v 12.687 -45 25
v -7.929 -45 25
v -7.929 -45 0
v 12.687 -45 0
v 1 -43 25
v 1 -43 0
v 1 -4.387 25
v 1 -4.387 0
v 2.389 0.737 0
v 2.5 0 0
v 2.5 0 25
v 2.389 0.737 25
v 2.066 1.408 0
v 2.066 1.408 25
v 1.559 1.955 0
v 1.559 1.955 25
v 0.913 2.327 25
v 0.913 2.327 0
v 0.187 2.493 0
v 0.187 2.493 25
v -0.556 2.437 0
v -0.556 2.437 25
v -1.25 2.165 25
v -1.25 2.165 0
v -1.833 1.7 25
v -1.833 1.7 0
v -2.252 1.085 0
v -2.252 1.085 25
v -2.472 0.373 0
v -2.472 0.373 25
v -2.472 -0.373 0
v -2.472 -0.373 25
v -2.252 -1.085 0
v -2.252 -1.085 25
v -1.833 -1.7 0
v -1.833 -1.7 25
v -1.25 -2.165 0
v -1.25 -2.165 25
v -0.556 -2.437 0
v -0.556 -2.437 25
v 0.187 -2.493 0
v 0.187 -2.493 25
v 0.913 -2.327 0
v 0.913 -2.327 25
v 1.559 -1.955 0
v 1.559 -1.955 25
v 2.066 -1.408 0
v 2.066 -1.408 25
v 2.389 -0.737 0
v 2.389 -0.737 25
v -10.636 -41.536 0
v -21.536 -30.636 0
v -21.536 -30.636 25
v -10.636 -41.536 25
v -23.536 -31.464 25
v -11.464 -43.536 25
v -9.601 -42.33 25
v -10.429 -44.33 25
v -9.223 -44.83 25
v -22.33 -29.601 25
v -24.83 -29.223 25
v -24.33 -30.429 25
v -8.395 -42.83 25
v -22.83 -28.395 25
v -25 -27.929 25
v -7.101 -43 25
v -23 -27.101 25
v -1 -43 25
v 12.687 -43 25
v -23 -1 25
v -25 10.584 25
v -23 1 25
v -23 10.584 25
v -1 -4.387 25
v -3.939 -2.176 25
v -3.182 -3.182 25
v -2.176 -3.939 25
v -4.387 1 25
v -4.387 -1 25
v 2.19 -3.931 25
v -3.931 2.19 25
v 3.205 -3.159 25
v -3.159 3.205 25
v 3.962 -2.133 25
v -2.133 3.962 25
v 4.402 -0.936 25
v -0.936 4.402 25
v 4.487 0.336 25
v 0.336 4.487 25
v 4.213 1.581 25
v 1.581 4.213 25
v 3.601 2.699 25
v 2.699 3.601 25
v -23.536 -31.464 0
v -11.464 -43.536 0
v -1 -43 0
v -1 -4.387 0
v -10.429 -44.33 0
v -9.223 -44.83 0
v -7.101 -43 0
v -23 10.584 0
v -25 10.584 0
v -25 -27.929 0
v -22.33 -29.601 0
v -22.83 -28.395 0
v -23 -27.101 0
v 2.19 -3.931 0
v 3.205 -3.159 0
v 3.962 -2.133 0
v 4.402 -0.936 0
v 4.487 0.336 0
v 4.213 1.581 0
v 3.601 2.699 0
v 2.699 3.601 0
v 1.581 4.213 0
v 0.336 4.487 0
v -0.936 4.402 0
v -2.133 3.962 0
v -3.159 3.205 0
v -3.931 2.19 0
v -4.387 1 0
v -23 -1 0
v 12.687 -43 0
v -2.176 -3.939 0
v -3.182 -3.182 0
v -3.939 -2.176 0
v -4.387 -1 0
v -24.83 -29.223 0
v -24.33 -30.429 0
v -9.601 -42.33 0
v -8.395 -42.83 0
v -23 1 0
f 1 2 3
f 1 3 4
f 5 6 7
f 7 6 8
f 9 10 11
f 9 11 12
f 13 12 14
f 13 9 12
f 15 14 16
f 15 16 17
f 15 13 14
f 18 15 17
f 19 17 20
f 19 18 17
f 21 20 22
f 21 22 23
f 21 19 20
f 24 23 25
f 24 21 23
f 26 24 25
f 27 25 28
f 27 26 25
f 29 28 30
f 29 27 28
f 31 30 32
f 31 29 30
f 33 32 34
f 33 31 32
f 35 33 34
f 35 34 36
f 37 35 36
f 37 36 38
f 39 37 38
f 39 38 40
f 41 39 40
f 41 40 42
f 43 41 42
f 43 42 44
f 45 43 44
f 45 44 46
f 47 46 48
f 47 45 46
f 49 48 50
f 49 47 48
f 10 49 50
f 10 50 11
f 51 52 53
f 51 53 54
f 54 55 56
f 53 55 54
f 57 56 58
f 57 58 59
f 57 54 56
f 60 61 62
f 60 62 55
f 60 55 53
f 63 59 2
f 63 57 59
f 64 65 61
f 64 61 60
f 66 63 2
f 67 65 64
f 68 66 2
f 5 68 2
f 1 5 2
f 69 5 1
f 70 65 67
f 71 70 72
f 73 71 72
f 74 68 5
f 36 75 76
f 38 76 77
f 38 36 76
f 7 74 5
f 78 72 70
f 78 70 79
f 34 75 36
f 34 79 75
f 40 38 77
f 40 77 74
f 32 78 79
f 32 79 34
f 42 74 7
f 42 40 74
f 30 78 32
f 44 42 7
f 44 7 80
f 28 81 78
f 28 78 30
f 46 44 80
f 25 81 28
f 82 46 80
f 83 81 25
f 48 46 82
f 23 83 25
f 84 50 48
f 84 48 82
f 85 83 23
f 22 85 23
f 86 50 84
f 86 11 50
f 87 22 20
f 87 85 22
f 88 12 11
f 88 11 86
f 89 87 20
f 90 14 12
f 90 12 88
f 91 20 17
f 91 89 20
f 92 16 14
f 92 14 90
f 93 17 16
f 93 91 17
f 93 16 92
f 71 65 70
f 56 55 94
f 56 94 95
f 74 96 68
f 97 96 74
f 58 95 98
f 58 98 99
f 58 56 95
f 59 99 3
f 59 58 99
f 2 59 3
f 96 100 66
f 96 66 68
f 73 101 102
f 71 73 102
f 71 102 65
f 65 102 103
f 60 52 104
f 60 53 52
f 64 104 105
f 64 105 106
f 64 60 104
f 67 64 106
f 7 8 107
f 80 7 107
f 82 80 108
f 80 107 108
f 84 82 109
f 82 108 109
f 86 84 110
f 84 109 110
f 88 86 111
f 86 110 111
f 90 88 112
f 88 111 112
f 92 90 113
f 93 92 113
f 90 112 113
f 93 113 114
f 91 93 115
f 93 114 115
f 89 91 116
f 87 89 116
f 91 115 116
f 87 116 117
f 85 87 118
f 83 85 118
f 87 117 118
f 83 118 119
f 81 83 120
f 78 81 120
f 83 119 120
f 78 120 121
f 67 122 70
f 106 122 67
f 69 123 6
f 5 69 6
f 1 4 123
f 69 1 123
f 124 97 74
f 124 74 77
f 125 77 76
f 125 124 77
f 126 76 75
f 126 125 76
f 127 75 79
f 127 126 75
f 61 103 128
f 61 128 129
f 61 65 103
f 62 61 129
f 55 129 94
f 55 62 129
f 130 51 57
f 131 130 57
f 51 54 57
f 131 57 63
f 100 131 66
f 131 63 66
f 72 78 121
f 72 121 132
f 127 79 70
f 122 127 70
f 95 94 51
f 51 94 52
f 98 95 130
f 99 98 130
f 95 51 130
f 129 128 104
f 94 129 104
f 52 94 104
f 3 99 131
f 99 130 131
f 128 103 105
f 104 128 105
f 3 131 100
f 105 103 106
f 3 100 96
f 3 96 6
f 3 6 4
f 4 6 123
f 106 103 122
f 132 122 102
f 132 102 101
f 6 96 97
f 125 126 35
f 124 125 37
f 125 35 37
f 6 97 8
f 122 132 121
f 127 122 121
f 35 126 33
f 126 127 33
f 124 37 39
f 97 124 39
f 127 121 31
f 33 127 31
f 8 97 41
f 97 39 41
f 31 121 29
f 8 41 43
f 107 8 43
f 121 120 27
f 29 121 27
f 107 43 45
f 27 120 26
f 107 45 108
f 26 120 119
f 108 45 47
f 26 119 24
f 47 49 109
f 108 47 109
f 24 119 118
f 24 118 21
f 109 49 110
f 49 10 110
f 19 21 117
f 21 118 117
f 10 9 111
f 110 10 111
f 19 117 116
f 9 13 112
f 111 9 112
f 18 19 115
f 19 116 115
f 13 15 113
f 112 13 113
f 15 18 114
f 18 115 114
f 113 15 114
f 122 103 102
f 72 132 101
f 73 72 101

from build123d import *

# Parameters (mm, degrees)
SKETCH1_R           = 2.5
BOSS_EXTRUDE1_DEPTH = 25
FILLET1_R           = 5


with BuildPart() as part:
    # Sketch1 → Boss-Extrude1 (new body)
    with BuildSketch(Plane.XY):
        with BuildLine():
            Line((-25, 10.583953595), (-25, -30))
            Line((-25, -30), (-10, -45))
            Line((-10, -45), (12.687018602, -45))
            Line((12.687018602, -45), (12.687018602, -43))
            Line((12.687018602, -43), (1, -43))
            Line((1, -43), (1, -4.387482194))
            ThreePointArc((1, -4.387482194), (3.181980515, 3.181980515), (-4.387482194, 1))
            Line((-4.387482194, 1), (-23, 1))
            Line((-23, 1), (-23, 10.583953595))
            Line((-23, 10.583953595), (-25, 10.583953595))
        make_face()
        Circle(SKETCH1_R, mode=Mode.SUBTRACT)
        with BuildLine():
            Line((-23, -29.171572875), (-9.171572875, -43))
            Line((-9.171572875, -43), (-1, -43))
            Line((-1, -43), (-1, -4.387482194))
            ThreePointArc((-1, -4.387482194), (-3.181980515, -3.181980515), (-4.387482194, -1))
            Line((-4.387482194, -1), (-23, -1))
            Line((-23, -1), (-23, -29.171572875))
        make_face(mode=Mode.SUBTRACT)
    extrude(amount=BOSS_EXTRUDE1_DEPTH)

    # Fillet1
    fillet1_edges = [part.edges().sort_by_distance(p)[0] for p in [
        (-10, -45, 12.5),
        (-25, -30, 12.5),
        (-23, -29.171572875, 12.5),
        (-9.171572875, -43, 12.5),
    ]]
    fillet(fillet1_edges, radius=FILLET1_R)


solid = part.part
